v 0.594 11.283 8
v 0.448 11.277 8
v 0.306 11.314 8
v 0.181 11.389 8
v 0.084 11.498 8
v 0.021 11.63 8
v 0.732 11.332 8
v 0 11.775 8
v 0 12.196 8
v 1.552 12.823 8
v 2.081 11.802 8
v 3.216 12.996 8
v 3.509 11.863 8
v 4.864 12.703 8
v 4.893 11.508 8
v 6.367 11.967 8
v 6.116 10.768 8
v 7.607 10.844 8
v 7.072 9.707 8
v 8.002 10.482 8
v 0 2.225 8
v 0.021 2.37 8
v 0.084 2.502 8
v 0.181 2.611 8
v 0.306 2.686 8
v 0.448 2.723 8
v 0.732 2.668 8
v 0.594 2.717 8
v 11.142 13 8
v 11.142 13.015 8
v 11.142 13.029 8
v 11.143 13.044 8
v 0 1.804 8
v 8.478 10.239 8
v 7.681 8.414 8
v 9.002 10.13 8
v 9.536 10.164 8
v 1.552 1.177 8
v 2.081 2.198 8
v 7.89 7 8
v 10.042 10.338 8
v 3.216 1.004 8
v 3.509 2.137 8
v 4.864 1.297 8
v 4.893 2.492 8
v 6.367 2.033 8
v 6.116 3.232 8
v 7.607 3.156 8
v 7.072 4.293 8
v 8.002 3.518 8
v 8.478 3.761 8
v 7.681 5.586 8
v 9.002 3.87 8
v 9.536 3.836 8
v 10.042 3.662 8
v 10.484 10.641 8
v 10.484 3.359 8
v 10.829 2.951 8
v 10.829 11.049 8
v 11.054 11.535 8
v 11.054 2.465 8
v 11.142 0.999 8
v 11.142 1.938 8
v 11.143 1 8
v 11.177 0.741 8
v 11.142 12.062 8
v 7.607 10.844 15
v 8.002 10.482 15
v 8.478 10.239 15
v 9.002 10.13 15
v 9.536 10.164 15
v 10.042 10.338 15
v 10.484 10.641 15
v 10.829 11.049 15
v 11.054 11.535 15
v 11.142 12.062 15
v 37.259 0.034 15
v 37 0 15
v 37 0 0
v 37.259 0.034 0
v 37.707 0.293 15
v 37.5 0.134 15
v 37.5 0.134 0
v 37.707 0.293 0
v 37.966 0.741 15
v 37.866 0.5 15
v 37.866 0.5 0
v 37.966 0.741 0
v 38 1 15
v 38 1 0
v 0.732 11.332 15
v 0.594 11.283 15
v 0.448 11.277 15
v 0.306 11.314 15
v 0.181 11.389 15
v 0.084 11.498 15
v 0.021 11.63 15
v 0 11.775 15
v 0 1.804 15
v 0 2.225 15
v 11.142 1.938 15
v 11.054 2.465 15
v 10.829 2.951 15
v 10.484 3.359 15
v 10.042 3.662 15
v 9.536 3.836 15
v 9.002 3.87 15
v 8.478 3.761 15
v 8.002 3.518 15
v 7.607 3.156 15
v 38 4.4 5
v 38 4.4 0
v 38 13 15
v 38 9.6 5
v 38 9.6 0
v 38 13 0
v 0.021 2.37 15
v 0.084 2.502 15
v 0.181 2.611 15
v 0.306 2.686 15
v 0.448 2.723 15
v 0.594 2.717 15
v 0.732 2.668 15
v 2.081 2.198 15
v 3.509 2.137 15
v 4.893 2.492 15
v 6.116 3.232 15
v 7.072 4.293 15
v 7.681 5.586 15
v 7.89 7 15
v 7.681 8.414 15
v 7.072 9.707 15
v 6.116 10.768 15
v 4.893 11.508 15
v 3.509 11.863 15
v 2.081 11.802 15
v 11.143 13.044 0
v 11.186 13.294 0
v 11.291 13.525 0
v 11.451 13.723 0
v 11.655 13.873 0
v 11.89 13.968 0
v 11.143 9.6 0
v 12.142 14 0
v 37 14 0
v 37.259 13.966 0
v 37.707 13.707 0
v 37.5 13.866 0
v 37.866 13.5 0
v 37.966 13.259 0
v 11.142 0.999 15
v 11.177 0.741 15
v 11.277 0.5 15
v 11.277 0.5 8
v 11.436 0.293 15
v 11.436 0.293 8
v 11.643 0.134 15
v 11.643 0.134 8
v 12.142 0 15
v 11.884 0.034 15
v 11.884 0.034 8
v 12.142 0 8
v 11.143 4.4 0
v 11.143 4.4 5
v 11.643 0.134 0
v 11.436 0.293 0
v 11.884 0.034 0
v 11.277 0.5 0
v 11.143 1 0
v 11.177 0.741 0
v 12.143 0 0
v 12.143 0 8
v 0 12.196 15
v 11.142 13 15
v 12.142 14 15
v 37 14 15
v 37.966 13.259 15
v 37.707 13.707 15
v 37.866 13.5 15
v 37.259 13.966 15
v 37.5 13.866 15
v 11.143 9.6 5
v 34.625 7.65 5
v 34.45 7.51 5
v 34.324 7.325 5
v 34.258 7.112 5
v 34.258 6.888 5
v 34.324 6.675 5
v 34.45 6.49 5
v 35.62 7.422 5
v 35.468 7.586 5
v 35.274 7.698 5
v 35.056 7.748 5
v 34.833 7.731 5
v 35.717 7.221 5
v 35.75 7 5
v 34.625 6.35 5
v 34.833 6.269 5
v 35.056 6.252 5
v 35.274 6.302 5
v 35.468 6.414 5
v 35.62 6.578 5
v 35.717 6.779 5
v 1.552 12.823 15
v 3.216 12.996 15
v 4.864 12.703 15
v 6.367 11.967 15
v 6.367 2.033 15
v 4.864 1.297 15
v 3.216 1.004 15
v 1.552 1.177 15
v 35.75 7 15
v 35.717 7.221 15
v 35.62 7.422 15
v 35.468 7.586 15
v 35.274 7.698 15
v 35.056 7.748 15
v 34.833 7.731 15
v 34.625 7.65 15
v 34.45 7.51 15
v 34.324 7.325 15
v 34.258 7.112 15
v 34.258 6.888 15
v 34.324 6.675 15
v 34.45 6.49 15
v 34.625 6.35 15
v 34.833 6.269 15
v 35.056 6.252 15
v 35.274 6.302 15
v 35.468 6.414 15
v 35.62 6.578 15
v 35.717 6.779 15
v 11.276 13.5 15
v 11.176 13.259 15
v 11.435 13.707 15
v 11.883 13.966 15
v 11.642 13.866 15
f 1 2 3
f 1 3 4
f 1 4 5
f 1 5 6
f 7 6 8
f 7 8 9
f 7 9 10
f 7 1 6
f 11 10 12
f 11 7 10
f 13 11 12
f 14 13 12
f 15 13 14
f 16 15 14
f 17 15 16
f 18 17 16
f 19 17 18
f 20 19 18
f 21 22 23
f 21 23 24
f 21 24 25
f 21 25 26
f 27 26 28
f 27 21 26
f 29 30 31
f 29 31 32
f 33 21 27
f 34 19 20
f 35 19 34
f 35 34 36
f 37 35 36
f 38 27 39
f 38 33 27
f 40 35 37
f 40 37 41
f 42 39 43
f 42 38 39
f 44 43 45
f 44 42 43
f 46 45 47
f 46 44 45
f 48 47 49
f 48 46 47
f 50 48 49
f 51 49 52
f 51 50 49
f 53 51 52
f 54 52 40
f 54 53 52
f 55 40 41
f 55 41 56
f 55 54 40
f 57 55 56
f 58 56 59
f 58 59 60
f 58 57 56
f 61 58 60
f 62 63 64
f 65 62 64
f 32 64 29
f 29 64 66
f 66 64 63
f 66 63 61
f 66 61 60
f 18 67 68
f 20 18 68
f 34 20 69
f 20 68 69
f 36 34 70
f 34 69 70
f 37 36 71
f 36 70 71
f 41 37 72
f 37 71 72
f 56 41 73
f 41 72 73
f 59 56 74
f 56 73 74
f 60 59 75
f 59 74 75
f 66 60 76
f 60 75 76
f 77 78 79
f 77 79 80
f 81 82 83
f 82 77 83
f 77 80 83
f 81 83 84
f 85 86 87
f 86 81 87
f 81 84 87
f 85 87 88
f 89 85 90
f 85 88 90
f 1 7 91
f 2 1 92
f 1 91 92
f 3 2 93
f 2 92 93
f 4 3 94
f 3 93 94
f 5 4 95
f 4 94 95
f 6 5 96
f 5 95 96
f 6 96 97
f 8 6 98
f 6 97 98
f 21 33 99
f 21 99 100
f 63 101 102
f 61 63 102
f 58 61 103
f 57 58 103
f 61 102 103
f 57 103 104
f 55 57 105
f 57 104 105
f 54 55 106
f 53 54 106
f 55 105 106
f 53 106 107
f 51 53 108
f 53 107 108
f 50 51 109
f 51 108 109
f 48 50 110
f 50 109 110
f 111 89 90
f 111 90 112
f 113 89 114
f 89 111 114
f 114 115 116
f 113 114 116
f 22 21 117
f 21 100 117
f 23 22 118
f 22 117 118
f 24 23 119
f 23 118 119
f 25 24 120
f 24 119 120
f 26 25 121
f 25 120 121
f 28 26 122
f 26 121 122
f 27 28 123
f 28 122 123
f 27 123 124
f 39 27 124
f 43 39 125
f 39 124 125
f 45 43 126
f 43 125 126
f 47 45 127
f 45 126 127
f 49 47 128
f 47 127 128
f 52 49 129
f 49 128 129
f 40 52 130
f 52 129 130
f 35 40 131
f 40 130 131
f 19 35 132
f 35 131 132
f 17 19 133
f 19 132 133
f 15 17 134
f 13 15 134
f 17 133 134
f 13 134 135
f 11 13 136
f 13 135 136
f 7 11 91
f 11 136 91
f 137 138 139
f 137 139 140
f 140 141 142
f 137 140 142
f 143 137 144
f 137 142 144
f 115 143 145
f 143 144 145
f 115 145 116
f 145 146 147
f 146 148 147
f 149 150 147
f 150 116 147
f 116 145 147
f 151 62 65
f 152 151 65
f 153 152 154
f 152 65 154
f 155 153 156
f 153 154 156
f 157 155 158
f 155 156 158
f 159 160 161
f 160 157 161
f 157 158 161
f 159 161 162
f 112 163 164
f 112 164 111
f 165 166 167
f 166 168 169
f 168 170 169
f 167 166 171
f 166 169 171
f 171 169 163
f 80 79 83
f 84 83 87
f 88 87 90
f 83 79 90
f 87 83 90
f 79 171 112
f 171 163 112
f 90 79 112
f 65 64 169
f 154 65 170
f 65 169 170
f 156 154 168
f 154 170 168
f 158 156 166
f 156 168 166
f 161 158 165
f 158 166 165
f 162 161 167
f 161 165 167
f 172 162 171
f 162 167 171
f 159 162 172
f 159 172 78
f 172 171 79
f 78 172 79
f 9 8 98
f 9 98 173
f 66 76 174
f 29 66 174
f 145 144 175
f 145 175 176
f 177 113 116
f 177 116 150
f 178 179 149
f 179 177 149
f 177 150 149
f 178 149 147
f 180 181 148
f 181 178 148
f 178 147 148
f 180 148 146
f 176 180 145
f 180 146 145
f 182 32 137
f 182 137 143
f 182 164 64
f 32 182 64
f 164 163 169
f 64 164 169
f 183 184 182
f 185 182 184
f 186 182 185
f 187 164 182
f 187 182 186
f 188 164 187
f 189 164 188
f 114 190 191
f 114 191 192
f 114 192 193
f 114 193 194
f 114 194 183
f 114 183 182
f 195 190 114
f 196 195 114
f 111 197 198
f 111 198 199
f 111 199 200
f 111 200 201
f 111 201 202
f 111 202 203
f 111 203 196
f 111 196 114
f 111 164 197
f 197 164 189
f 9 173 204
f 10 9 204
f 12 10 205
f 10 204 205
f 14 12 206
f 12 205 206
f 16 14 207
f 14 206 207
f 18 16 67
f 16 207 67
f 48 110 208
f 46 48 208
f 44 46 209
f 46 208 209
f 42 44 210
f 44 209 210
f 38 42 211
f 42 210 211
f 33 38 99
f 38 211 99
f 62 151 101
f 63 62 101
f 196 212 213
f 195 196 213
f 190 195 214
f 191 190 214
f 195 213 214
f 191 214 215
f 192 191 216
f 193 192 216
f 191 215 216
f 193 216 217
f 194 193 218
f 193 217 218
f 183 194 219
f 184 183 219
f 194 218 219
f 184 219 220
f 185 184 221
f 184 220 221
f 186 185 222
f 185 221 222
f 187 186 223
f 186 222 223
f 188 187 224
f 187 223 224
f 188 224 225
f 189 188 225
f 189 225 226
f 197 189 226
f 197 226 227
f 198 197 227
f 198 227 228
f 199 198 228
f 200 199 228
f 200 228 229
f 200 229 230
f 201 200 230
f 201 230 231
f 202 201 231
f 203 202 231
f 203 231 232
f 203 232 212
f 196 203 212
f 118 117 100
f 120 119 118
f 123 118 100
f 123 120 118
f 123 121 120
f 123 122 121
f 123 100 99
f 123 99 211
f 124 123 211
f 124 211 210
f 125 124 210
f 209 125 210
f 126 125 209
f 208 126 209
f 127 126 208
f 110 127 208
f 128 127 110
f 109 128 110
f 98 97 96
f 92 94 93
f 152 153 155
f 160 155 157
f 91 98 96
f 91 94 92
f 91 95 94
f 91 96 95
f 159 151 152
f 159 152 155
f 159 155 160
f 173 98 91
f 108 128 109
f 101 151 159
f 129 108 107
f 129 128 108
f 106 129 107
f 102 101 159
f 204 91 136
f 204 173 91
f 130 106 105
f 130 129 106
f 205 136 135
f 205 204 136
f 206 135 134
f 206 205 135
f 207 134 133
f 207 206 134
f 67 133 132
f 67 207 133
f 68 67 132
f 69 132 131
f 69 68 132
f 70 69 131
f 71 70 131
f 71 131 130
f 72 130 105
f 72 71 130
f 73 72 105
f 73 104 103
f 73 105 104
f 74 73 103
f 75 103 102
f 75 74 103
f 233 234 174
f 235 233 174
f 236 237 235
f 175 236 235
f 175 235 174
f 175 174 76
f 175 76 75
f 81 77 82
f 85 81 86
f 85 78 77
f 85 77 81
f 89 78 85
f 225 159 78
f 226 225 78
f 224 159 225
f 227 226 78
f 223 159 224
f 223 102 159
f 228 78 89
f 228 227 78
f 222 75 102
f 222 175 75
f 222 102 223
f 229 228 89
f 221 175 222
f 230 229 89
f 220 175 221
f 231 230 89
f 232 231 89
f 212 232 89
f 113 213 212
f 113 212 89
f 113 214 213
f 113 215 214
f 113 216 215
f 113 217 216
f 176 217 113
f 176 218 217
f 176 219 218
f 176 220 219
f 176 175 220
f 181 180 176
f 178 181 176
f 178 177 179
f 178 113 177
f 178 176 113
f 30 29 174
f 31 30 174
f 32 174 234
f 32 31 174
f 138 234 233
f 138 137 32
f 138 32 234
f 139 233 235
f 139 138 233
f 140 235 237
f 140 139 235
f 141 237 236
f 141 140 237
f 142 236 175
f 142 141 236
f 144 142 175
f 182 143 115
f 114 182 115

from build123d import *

# Parameters (mm, degrees)
F0_W         = 38
F0_H         = 14
F1_DEPTH     = 15
F2_R         = 4.8895
F3_DEPTH     = 15.001
F4_W         = 30.8590809897
F4_H         = 5.2
F5_DEPTH     = 5
F7_DEPTH     = 15.001
F8_W         = 13.0838444641
F8_H         = 13.9913465828
F9_DEPTH     = 8
F11_R        = 0.75
F12_DEPTH    = 15.001
F13_R        = 0.5
F14_T1_DEPTH = 9.498744071
F14_T3_DEPTH = 10.5
F14_T5_DEPTH = 20


# Not quite as in the source:
# - a fillet or chamfer that OpenCascade refuses, or shapes differently, is made with other operations: its cross-section is extruded or revolved along the edge and cut away or added


with BuildPart() as f1:
    # F0 (on Top) → F1 (new body)
    with BuildSketch(Plane.XY):
        with Locations((19, 7)):
            Rectangle(F0_W, F0_H)
    extrude(amount=F1_DEPTH)

    # F2 (on face) → F3 (cut, through all)
    with BuildSketch(Plane.XY.offset(15)):
        with Locations((3, 7)):
            Circle(F2_R)
    extrude(amount=-F3_DEPTH, mode=Mode.SUBTRACT)

    # F4 (on face) → F5 (cut)
    with BuildSketch(Plane(origin=(0, 0, 0), x_dir=(1, 0, 0), z_dir=(0, 0, -1))):
        with Locations((22.5704595052, -7)):
            Rectangle(F4_W, F4_H)
    extrude(amount=-F5_DEPTH, mode=Mode.SUBTRACT)

    # F6 (on face) → F7 (cut, through all)
    with BuildSketch(Plane.XY.offset(15)):
        with BuildLine():
            ThreePointArc((7.60725, 3.1564017591), (4.0503160688, 1.0926455874), (0, 1.8038475773))
            Line((0, 1.8038475773), (0, 0))
            Line((0, 0), (11.143, 0))
            Line((11.143, 0), (11.1420263596, 1.9376011727))
            ThreePointArc((11.1420263596, 1.9376011727), (9.7949393865, 3.7659627841), (7.60725, 3.1564017591))
        make_face()
        with BuildLine():
            ThreePointArc((0, 12.1961524227), (4.0503160688, 12.9073544126), (7.60725, 10.8435982409))
            ThreePointArc((7.60725, 10.8435982409), (9.7949393865, 10.2340372159), (11.1420263596, 12.0623988273))
            Line((11.1420263596, 12.0623988273), (11.1420263596, 14))
            Line((11.1420263596, 14), (0, 14))
            Line((0, 14), (0, 12.1961524227))
        make_face()
    extrude(amount=-F7_DEPTH, mode=Mode.SUBTRACT)

    # F8 (on face) → F9 (cut)
    with BuildSketch(Plane(origin=(0, 0, 0), x_dir=(1, 0, 0), z_dir=(0, 0, -1))):
        with Locations((4.6010777679, -6.9956732914)):
            Rectangle(F8_W, F8_H)
    extrude(amount=-F9_DEPTH, mode=Mode.SUBTRACT)

    # F11 (on face) → F12 (cut, through all)
    with BuildSketch(Plane.XY.offset(15)):
        with Locations((35, 7)):
            Circle(F11_R)
    extrude(amount=-F12_DEPTH, mode=Mode.SUBTRACT)

    # F13
    f13_edges = [f1.edges().sort_by_distance(p)[0] for p in [
        (0, 10.860986, 11.5),
        (0, 3.139014, 11.5),
    ]]
    fillet(f13_edges, radius=F13_R)

    # F14: fillet of radius 1 on 5 edges, made by hand

    # F14_s2 → F14_t1 (cut)
    with BuildSketch(Plane.XY.offset(8)):
        with BuildLine():
            ThreePointArc((11.1424977547, 0.9994975022), (11.4355685293, 0.2927155813), (12.1424976284, 0))
            Line((12.1424976284, 0), (11.143, 0))
            Line((11.143, 0), (11.1424977547, 0.9994975022))
        make_face()
    extrude(amount=F14_T1_DEPTH, mode=Mode.SUBTRACT)

    # F14_s4 → F14_t3 (cut)
    with BuildSketch(Plane.XY.offset(-2.5)):
        with BuildLine():
            ThreePointArc((11.143, 1), (11.4358932188, 0.2928932188), (12.143, 0))
            Line((12.143, 0), (11.143, 0))
            Line((11.143, 0), (11.143, 1))
        make_face()
    extrude(amount=F14_T3_DEPTH, mode=Mode.SUBTRACT)

    # F14_s6 → F14_t5 (cut)
    with BuildSketch(Plane.XY.offset(-2.5)):
        with BuildLine():
            ThreePointArc((37, 0), (37.7071067812, 0.2928932188), (38, 1))
            Line((38, 1), (38, 0))
            Line((38, 0), (37, 0))
        make_face()
        with BuildLine():
            ThreePointArc((11.1420263596, 13), (11.4349195784, 13.7071067812), (12.1420263596, 14))
            Line((12.1420263596, 14), (11.1420263596, 14))
            Line((11.1420263596, 14), (11.1420263596, 13))
        make_face()
        with BuildLine():
            ThreePointArc((38, 13), (37.7071067812, 13.7071067812), (37, 14))
            Line((37, 14), (38, 14))
            Line((38, 14), (38, 13))
        make_face()
    extrude(amount=F14_T5_DEPTH, mode=Mode.SUBTRACT)


solid = f1.part
